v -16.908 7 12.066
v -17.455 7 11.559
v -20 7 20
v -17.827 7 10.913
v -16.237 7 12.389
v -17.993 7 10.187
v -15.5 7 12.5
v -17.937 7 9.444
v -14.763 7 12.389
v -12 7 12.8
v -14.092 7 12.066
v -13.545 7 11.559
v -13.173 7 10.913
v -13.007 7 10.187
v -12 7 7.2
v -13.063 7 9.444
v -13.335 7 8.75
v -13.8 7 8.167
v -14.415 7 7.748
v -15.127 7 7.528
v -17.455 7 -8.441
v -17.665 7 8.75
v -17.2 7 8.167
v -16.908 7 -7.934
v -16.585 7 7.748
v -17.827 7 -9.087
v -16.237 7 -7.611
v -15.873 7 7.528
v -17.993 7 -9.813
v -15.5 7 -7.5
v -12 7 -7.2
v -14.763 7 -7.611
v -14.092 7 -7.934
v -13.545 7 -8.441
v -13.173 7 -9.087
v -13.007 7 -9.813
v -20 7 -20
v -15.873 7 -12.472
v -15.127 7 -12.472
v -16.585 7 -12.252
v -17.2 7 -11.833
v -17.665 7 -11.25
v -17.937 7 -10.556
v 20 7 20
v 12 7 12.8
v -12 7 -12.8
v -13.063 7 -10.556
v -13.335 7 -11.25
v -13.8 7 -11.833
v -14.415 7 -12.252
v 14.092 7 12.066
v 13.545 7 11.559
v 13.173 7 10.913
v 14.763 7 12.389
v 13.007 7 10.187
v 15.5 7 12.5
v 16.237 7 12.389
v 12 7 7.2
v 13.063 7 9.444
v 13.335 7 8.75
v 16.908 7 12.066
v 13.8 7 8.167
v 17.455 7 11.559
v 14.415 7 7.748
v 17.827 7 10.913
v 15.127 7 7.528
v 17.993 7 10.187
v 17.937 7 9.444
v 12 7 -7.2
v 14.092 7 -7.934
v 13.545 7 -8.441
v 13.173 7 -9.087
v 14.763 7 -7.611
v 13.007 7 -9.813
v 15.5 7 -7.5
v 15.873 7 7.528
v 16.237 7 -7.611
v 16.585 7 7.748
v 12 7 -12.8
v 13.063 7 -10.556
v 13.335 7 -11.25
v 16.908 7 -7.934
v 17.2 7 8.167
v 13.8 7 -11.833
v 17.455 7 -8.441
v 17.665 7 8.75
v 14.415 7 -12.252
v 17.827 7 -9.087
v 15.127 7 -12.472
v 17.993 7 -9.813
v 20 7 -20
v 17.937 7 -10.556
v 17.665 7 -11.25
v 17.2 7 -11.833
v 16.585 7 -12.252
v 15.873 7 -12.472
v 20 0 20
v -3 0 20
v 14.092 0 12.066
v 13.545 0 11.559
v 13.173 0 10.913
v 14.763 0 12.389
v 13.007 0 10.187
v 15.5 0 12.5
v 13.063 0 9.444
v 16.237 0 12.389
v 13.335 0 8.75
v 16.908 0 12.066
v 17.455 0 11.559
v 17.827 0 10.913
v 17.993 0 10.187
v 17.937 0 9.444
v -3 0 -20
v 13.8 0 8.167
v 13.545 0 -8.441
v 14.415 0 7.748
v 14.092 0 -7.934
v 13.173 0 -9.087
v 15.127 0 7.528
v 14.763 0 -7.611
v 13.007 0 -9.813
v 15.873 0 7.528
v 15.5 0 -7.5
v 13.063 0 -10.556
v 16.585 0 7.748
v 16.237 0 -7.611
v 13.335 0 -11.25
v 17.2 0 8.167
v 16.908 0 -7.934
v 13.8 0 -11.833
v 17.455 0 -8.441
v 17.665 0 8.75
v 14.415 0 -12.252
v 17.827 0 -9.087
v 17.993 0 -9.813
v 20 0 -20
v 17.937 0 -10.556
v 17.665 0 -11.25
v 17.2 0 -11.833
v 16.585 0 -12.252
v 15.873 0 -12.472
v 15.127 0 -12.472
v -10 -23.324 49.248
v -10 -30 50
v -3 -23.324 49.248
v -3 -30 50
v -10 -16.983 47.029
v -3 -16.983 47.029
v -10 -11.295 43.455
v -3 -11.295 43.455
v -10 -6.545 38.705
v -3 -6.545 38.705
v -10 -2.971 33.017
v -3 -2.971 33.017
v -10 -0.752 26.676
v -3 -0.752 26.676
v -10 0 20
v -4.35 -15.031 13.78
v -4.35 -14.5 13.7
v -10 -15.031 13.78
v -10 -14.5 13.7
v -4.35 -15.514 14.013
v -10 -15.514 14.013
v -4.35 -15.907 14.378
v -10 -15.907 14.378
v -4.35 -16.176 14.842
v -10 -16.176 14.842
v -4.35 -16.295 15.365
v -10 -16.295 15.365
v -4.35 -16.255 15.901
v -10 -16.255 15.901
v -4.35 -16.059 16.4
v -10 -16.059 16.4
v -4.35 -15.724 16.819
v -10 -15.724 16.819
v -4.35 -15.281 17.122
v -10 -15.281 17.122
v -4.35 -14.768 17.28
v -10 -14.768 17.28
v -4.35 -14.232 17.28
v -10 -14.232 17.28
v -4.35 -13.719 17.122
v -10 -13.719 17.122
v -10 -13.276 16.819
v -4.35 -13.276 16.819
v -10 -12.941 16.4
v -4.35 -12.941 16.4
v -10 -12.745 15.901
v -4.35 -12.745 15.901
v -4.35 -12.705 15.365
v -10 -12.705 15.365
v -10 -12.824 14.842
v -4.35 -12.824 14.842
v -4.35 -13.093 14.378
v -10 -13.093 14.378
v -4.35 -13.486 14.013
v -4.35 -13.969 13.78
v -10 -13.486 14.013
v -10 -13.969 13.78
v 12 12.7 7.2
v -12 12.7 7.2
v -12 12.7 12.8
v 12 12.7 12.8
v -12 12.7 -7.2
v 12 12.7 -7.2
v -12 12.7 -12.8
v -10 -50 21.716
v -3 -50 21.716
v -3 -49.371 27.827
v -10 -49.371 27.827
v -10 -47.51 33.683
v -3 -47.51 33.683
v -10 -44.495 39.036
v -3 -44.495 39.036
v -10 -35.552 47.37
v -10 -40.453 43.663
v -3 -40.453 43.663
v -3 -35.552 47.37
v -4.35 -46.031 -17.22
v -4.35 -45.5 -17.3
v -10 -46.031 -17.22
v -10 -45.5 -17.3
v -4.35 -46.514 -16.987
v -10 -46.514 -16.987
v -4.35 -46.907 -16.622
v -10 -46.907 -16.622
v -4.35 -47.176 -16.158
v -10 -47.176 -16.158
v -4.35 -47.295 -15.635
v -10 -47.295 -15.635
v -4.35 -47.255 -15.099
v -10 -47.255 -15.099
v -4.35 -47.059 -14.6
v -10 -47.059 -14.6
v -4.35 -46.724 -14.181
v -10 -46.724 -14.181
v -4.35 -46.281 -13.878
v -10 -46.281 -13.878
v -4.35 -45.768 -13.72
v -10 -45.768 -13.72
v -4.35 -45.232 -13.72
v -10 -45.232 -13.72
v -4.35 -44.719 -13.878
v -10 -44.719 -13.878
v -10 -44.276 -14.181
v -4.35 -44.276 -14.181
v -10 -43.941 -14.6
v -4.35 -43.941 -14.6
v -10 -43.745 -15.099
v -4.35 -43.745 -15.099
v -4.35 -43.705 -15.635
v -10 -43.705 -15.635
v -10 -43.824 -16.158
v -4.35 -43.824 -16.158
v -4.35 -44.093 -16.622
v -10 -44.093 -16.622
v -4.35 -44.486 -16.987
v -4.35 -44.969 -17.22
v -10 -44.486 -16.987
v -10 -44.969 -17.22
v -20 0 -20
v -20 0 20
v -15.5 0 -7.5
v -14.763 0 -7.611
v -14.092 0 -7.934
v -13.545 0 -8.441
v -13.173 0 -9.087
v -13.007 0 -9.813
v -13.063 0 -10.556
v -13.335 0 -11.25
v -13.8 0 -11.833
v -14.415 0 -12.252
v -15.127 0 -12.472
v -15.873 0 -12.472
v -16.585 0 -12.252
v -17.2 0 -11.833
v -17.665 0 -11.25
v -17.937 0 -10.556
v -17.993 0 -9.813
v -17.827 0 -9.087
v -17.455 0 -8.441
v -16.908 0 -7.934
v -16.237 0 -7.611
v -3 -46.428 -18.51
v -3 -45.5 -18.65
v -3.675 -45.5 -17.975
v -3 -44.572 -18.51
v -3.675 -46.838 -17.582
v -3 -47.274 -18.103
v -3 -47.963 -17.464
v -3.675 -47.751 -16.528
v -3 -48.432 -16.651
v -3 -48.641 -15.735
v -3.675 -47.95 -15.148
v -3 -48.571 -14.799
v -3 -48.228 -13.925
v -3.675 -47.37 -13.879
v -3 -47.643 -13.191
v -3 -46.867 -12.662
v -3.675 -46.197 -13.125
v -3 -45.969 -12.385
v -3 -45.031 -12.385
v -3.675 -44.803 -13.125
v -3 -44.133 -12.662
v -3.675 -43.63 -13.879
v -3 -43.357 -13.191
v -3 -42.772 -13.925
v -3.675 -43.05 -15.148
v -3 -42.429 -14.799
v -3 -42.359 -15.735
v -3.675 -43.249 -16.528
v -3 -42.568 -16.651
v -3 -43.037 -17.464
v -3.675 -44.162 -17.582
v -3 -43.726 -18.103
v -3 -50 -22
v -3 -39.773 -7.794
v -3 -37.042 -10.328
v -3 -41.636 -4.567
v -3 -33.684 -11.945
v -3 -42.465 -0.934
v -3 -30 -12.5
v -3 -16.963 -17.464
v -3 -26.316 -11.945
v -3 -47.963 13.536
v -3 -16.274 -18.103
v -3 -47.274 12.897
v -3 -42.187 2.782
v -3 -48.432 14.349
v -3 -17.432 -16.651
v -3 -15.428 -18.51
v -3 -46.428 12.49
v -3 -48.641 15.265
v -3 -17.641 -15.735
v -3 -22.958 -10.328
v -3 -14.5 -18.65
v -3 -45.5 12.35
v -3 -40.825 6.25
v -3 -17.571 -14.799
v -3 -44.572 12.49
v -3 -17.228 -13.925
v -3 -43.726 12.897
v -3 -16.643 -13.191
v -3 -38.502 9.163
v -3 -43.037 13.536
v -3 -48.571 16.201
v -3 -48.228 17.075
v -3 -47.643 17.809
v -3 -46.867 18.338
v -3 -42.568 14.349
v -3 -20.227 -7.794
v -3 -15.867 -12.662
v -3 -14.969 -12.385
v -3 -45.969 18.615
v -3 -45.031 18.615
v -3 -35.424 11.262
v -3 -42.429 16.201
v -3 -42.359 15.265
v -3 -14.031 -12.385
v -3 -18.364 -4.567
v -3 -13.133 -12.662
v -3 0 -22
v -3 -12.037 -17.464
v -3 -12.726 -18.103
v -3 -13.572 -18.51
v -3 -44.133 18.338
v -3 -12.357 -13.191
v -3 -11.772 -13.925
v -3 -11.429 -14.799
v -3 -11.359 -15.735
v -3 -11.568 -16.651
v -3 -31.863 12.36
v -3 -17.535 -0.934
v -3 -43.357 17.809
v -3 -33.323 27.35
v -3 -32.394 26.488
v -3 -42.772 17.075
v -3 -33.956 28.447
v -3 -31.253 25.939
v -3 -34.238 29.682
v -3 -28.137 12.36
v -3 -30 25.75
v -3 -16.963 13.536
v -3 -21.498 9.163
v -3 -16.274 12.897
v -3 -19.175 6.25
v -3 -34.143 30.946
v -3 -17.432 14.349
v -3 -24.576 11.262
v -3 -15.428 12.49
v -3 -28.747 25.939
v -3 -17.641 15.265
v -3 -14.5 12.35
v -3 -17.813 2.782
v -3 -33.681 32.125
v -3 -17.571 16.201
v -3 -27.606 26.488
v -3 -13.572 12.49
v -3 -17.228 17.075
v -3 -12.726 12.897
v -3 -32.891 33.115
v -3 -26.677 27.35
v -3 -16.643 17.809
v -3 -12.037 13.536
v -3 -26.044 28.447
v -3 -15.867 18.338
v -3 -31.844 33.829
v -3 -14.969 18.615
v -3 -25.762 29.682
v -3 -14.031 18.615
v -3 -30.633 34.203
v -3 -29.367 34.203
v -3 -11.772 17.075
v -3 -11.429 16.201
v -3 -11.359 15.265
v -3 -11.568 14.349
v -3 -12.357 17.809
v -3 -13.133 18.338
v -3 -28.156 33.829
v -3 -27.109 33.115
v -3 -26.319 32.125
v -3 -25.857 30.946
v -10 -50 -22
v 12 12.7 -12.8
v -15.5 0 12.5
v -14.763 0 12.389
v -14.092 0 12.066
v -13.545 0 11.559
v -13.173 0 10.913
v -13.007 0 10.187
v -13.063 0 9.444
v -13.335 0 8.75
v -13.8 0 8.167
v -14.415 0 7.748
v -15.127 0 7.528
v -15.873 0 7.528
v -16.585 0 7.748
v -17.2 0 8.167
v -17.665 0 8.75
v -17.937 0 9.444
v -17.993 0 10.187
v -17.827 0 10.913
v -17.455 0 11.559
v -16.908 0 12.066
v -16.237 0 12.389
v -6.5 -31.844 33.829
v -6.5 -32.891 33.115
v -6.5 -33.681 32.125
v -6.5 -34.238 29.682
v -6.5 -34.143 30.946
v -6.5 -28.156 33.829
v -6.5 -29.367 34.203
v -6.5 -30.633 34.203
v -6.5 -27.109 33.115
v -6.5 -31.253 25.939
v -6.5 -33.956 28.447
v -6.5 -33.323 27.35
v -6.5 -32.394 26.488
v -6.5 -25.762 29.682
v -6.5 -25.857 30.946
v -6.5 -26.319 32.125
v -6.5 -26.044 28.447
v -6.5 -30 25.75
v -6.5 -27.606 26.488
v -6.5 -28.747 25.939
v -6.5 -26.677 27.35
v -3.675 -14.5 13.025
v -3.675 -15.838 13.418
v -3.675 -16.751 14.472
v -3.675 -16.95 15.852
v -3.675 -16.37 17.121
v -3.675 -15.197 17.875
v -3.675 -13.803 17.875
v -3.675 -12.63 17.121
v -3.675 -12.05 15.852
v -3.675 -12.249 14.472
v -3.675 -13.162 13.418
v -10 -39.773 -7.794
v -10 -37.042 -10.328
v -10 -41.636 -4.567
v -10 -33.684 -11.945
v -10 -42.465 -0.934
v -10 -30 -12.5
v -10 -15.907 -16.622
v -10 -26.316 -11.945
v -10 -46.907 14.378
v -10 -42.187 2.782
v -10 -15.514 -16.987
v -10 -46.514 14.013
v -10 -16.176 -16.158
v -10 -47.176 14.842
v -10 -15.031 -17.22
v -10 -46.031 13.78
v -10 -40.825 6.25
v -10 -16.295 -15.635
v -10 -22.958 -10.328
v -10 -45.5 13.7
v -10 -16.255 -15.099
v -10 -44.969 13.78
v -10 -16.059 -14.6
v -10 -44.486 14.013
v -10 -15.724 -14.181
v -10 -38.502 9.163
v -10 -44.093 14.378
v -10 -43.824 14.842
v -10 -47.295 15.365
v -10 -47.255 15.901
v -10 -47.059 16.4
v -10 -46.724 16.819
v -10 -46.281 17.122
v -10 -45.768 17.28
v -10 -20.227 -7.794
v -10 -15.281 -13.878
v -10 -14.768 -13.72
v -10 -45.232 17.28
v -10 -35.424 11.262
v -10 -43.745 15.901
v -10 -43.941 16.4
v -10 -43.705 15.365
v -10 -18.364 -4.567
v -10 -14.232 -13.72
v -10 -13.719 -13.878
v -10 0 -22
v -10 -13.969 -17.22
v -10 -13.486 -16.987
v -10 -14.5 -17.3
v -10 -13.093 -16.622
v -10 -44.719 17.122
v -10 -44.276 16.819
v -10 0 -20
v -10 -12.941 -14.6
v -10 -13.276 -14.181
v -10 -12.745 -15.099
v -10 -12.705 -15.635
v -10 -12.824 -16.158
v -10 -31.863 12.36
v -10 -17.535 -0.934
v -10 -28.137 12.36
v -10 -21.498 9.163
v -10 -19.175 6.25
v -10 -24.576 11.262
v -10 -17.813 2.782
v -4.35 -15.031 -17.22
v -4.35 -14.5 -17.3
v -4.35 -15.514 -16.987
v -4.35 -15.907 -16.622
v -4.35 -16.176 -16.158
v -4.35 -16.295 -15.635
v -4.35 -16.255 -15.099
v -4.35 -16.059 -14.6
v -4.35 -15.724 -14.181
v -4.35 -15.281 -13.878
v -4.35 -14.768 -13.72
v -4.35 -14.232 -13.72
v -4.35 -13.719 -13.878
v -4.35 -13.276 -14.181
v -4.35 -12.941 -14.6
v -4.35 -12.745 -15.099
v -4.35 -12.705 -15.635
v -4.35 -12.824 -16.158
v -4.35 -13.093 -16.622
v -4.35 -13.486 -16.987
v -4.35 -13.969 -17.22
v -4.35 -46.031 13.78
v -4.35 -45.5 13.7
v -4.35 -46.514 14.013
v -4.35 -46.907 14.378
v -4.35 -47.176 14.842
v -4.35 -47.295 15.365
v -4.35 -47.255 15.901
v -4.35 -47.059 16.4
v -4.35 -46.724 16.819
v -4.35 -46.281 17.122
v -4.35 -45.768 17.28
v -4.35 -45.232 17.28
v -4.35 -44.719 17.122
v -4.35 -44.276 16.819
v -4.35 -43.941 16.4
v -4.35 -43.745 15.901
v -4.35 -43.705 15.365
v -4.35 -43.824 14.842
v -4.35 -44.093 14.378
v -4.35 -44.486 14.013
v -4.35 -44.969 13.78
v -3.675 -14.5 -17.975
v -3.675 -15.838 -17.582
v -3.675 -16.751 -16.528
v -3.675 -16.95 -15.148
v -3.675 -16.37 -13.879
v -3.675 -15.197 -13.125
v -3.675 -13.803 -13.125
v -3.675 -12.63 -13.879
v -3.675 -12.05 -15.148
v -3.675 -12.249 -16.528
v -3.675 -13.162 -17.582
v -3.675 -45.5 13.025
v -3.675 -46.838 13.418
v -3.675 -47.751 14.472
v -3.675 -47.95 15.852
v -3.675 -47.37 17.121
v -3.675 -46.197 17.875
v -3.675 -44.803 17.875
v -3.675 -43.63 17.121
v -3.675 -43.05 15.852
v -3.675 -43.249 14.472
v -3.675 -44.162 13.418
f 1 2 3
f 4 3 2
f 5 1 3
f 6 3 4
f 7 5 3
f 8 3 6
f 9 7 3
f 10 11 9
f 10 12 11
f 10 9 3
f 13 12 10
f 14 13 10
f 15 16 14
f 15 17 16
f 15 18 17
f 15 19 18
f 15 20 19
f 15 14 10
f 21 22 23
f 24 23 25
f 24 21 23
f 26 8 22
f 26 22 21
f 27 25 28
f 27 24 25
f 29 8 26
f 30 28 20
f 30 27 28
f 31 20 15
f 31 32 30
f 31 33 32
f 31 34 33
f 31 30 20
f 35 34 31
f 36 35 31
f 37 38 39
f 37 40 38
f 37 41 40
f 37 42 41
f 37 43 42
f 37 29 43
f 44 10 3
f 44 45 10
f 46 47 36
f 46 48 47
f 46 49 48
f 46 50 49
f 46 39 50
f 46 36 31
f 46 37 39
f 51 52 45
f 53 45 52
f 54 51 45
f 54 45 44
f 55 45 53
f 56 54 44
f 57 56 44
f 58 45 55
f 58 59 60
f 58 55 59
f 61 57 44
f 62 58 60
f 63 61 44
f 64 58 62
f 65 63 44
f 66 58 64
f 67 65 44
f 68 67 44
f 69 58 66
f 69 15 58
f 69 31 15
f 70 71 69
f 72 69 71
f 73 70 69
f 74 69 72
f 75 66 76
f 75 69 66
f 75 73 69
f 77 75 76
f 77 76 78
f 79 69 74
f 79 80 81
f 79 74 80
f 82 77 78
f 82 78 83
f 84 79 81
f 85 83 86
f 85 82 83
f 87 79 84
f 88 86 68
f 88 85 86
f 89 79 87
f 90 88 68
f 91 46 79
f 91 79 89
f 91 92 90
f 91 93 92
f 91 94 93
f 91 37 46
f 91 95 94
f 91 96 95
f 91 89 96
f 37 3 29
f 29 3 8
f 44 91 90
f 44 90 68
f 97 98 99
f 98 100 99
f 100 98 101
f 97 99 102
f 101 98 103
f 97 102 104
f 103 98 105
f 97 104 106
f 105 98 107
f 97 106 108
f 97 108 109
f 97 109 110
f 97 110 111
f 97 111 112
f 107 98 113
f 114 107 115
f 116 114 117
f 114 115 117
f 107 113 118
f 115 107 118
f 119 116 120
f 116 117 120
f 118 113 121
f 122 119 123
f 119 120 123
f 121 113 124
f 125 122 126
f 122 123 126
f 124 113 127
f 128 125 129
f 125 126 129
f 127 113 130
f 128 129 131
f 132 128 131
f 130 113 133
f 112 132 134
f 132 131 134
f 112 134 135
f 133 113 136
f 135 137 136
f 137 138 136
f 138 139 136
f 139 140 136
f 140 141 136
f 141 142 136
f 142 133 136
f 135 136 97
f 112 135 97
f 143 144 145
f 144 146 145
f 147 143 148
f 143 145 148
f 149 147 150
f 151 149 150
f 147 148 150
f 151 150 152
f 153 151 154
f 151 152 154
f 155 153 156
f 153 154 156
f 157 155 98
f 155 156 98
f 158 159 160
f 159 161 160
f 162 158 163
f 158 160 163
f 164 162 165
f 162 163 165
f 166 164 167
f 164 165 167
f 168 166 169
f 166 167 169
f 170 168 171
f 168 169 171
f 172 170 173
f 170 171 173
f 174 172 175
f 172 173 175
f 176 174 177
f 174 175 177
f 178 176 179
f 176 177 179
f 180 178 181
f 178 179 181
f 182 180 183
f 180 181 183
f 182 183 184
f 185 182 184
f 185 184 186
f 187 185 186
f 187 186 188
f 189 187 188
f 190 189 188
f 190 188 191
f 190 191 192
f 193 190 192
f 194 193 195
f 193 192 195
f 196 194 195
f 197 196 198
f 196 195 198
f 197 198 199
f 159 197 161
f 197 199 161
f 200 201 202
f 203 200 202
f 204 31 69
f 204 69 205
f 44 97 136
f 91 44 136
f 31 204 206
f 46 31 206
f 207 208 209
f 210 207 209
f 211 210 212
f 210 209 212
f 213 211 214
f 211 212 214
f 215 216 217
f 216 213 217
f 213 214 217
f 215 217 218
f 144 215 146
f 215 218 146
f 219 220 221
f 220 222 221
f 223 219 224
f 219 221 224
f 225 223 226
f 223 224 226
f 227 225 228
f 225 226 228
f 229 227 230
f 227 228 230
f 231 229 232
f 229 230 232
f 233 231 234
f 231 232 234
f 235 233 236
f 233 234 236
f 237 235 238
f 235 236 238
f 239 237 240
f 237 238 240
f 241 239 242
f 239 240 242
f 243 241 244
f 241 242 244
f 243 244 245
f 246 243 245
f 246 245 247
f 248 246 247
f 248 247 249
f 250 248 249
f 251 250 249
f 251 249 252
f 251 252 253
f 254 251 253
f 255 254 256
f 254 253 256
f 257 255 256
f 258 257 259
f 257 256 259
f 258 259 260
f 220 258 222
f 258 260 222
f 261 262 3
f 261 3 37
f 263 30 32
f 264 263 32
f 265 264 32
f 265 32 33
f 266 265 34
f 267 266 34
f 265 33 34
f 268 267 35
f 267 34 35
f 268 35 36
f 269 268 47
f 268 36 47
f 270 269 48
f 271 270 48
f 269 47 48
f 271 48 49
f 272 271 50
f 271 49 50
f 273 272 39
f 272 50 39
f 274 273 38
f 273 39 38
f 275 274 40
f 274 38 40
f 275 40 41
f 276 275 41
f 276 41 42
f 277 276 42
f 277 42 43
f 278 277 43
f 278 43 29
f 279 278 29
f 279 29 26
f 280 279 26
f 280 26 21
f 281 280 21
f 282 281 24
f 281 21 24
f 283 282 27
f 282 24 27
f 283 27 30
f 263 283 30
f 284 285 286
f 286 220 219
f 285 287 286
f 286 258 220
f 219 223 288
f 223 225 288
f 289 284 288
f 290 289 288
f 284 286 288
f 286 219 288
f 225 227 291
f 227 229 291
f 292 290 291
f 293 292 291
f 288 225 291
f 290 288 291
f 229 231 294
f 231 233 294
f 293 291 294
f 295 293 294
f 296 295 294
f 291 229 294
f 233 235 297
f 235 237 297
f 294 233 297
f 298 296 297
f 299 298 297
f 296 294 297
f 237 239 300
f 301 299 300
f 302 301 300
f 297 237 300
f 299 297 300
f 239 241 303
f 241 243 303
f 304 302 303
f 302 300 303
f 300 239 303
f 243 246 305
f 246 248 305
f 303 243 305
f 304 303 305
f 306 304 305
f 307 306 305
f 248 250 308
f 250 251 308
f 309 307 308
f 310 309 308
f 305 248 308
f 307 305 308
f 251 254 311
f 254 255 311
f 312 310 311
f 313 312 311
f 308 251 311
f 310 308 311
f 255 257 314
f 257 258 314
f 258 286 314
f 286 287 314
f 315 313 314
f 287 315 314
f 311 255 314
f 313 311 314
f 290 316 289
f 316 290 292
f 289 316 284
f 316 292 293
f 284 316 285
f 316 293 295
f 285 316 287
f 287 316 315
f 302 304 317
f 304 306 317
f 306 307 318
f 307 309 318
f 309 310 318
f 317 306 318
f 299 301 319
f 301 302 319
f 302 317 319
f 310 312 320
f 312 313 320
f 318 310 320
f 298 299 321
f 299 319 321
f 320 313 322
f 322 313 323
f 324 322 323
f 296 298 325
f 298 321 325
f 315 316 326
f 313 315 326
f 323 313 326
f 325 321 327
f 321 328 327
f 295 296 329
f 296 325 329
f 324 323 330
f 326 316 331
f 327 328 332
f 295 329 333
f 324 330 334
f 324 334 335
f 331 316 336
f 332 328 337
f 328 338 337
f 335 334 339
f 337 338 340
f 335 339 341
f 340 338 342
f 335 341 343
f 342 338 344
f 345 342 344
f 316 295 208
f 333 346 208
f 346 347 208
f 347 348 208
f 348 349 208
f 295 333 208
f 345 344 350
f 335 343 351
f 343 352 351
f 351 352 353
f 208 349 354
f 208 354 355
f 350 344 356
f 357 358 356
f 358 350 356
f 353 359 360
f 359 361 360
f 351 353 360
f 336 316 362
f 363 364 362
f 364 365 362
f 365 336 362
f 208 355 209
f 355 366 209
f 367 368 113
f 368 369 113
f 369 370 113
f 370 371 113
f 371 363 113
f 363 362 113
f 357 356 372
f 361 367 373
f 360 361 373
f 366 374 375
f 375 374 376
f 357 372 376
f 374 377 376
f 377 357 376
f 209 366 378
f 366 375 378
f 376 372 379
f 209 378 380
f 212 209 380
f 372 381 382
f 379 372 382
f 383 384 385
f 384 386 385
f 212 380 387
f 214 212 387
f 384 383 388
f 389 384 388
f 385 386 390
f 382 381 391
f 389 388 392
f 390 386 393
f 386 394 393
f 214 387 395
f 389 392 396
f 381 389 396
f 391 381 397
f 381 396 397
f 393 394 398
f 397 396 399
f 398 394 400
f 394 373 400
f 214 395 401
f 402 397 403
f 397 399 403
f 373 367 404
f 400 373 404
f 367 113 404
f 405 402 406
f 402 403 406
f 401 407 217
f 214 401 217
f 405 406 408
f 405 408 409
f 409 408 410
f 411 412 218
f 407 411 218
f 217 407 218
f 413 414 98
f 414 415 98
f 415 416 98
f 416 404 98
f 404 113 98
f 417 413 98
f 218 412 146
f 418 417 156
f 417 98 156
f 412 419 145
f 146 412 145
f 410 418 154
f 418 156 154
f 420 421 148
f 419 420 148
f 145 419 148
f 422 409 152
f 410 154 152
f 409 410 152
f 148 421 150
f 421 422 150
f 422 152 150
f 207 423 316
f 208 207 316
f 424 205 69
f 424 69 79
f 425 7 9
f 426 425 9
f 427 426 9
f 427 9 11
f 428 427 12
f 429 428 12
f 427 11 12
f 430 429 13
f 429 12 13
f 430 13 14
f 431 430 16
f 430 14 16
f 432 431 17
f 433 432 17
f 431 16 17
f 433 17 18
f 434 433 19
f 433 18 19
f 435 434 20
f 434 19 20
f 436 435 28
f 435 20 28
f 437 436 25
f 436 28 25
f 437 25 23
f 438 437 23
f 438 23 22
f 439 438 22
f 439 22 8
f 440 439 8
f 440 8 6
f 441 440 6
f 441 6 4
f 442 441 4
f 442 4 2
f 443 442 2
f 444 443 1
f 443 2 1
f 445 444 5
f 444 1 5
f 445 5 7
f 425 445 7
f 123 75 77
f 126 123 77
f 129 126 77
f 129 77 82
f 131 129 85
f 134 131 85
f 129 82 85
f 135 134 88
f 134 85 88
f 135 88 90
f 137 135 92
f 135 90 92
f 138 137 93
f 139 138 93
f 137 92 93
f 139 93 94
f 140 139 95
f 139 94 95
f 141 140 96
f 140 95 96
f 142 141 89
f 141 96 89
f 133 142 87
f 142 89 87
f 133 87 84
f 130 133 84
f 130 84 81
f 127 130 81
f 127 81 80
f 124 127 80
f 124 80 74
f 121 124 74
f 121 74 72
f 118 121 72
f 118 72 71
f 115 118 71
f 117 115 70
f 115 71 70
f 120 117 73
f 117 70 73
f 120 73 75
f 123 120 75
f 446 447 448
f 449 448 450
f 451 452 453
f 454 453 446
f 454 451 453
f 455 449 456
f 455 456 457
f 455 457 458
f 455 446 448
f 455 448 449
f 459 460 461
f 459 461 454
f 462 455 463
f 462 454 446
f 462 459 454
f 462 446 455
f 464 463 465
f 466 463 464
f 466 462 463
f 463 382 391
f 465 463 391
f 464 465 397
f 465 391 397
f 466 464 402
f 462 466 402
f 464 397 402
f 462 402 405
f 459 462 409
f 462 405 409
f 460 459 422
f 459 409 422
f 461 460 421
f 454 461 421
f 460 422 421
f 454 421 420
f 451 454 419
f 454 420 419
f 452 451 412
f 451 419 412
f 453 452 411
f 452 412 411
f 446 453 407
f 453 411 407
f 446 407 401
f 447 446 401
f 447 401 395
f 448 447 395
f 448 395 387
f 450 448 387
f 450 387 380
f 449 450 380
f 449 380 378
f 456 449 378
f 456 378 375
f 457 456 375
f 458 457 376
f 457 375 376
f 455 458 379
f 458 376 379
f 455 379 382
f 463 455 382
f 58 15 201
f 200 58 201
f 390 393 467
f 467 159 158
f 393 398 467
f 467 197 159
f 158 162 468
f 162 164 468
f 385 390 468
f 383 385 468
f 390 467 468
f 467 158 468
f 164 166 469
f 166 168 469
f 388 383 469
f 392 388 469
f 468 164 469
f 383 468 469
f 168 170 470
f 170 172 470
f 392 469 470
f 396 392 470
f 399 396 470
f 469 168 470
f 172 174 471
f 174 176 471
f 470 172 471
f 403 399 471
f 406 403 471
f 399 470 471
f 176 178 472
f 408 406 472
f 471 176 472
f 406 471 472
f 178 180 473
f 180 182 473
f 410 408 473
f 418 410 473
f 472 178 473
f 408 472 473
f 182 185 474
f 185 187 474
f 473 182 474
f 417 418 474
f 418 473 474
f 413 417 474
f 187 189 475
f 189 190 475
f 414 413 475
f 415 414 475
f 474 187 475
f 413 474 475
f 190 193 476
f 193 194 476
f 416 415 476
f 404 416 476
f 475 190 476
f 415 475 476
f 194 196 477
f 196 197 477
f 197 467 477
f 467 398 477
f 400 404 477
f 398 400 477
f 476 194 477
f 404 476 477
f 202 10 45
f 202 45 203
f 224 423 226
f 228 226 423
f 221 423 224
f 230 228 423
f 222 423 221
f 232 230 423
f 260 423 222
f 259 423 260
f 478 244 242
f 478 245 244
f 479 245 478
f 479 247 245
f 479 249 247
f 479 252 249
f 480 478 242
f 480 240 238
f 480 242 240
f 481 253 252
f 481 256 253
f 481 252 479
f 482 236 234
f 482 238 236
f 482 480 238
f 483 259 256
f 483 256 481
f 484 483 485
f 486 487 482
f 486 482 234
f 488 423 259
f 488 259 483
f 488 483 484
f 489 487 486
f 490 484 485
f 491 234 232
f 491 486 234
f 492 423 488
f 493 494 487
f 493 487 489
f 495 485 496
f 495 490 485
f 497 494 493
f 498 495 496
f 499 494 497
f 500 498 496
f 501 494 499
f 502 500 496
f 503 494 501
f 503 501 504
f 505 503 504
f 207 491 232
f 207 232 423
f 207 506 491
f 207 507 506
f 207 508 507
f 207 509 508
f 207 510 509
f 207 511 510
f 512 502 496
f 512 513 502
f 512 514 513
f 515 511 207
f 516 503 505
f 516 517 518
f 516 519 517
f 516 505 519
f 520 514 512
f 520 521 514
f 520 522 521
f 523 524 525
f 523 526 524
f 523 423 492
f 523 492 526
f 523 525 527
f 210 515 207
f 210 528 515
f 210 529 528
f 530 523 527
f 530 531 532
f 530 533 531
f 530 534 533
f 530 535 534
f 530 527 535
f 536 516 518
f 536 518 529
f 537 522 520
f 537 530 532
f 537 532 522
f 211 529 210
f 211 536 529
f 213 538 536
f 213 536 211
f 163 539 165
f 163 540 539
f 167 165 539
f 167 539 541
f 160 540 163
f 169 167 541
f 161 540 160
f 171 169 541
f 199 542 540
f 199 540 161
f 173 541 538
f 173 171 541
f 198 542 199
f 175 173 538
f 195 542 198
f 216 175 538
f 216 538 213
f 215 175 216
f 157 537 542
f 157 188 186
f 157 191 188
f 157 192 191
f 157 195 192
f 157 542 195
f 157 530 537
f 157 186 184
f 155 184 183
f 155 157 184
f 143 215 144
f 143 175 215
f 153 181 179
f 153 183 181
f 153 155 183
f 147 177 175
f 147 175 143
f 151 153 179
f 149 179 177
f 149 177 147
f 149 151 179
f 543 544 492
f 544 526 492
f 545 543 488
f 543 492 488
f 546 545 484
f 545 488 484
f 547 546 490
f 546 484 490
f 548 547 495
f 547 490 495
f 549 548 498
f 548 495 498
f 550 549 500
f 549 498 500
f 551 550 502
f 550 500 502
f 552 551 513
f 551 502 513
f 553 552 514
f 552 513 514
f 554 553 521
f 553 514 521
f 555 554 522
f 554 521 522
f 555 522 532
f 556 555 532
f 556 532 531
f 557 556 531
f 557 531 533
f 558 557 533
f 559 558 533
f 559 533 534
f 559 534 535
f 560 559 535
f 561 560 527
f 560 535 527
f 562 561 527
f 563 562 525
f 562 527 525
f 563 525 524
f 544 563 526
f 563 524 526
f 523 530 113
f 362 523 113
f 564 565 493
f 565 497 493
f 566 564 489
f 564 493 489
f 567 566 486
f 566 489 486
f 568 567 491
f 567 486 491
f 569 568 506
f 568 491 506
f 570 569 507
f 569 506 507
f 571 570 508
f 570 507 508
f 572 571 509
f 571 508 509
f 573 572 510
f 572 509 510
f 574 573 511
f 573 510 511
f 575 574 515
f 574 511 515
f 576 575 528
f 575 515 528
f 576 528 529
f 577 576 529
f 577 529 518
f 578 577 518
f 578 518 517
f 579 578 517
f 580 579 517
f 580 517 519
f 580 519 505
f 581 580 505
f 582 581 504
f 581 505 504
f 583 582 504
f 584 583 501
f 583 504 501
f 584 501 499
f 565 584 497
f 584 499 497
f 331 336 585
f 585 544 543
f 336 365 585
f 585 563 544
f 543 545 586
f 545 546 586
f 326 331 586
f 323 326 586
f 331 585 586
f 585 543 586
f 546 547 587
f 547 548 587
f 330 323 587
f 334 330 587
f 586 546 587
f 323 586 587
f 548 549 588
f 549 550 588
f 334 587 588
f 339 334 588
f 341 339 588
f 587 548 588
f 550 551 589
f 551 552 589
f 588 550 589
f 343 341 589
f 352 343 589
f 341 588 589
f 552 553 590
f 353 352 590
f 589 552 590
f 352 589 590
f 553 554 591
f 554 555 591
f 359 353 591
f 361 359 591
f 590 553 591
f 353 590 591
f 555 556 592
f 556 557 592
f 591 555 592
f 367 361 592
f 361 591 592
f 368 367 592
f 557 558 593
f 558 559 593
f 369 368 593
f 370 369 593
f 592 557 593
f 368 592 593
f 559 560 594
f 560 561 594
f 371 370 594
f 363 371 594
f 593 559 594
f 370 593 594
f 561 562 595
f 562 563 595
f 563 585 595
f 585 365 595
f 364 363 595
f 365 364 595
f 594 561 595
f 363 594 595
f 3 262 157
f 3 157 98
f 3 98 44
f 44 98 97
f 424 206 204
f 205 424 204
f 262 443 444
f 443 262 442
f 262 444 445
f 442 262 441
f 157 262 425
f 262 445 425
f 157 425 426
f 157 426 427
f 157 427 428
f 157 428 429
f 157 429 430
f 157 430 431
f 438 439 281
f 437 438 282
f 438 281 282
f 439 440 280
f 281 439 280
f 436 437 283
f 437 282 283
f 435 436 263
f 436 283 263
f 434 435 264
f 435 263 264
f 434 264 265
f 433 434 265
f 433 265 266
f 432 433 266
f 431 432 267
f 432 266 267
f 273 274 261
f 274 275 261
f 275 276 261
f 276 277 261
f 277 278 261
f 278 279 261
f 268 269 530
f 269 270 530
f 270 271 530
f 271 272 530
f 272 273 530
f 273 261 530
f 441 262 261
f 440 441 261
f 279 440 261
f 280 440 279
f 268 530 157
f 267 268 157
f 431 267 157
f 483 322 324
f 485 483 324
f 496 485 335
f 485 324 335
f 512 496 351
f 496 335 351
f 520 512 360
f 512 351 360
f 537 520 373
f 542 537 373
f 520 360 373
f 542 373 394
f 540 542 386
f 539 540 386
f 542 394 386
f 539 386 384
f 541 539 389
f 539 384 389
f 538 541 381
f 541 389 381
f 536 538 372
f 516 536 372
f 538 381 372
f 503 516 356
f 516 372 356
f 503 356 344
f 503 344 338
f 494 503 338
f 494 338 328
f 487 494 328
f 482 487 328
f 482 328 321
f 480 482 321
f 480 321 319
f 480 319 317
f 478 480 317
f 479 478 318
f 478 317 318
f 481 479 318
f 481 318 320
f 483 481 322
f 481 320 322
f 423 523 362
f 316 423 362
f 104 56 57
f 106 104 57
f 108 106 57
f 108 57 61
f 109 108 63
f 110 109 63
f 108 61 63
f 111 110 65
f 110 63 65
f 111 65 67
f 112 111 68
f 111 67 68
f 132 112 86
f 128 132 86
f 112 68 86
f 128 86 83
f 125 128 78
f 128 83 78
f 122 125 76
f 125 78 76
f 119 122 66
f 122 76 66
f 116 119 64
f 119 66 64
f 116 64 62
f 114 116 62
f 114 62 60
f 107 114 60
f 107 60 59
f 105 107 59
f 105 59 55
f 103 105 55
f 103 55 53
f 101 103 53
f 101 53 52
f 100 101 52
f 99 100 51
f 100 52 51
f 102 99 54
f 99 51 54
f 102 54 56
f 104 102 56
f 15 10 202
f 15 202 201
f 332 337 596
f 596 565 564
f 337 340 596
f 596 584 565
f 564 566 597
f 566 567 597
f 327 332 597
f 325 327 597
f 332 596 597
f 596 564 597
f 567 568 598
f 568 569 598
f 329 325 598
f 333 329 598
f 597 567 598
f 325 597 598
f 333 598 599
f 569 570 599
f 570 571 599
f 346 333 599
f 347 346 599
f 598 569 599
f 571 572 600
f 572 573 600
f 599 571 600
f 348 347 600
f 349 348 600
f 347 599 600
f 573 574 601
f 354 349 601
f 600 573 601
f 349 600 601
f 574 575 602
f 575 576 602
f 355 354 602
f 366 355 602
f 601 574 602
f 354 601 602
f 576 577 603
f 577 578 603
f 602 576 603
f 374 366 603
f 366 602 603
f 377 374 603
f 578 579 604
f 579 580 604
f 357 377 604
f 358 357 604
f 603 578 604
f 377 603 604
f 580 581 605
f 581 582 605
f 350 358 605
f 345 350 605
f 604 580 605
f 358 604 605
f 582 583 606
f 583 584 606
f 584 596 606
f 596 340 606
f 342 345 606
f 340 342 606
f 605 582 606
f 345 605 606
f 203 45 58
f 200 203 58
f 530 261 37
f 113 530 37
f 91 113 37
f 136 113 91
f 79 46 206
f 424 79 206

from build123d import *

# Parameters (mm, degrees)
CROQUIS1_W                                           = 40
CROQUIS1_H                                           = 40
SALIENTE_EXTRUIR1_DEPTH                              = 7
CROQUIS3_W                                           = 5.6
CROQUIS3_H                                           = 5.7
SALIENTE_EXTRUIR3_DEPTH                              = 40
CROQUIS19_W                                          = 8
CROQUIS19_H                                          = 40
CORTAR_EXTRUIR5_DEPTH                                = 5.7
CROQUIS20_R                                          = 2.5
CORTAR_EXTRUIR6_DEPTH                                = 7
CROQUIS21_W                                          = 7
CROQUIS21_H                                          = 72
SALIENTE_EXTRUIR4_DEPTH                              = 50
CROQUIS22_R                                          = 12.5
CORTAR_EXTRUIR7_DEPTH                                = 7
AVELLANADO_PARA_TORNILLO_CON_CABEZA_PLAN_D           = 3.6
AVELLANADO_PARA_TORNILLO_CON_CABEZA_PLAN_CSINK_D     = 6.3
AVELLANADO_PARA_TORNILLO_CON_CABEZA_PLAN_CSINK_ANGLE = 90
CROQUIS25_R                                          = 4.25
CORTAR_EXTRUIR8_DEPTH                                = 3.5
REDONDEO1_R                                          = 30
REDONDEO2_R                                          = 30


# Some blends are built 0.0001 mm under size
with BuildPart() as part:
    # Croquis1 → Saliente-Extruir1 (new body)
    with BuildSketch(Plane(origin=(0, 0, 0), x_dir=(1, 0, 0), z_dir=(0, 1, 0))):
        Rectangle(CROQUIS1_W, CROQUIS1_H)
    extrude(amount=SALIENTE_EXTRUIR1_DEPTH)

    # Croquis3 → Saliente-Extruir3 (add)
    with BuildSketch(Plane.ZY.offset(20)):
        with Locations((10, 9.85)):
            Rectangle(CROQUIS3_W, CROQUIS3_H)
        with Locations((-10, 9.85)):
            Rectangle(CROQUIS3_W, CROQUIS3_H)
    extrude(amount=-SALIENTE_EXTRUIR3_DEPTH)

    # Croquis19 → Cortar-Extruir5 (cut)
    with BuildSketch(Plane(origin=(0, 12.7, 0), x_dir=(1, 0, 0), z_dir=(0, 1, 0))):
        with Locations((-16, 0)):
            Rectangle(CROQUIS19_W, CROQUIS19_H)
        with Locations((16, 0)):
            Rectangle(CROQUIS19_W, CROQUIS19_H)
    extrude(amount=-CORTAR_EXTRUIR5_DEPTH, mode=Mode.SUBTRACT)

    # Croquis20 → Cortar-Extruir6 (cut)
    with BuildSketch(Plane(origin=(0, 7, 0), x_dir=(1, 0, 0), z_dir=(0, 1, 0))):
        with Locations(Location((-15.5, 10, 0), (0, 0, 270))):
            Circle(CROQUIS20_R)
        with Locations(Location((15.5, 10, 0), (0, 0, 270))):
            Circle(CROQUIS20_R)
        with Locations(Location((15.5, -10, 0), (0, 0, 270))):
            Circle(CROQUIS20_R)
        with Locations(Location((-15.5, -10, 0), (0, 0, 270))):
            Circle(CROQUIS20_R)
    extrude(amount=-CORTAR_EXTRUIR6_DEPTH, mode=Mode.SUBTRACT)

    # Croquis21 → Saliente-Extruir4 (add)
    with BuildSketch(Plane.XZ):
        with Locations((-6.5, 14)):
            Rectangle(CROQUIS21_W, CROQUIS21_H)
    extrude(amount=SALIENTE_EXTRUIR4_DEPTH)

    # Croquis22 → Cortar-Extruir7 (cut)
    with BuildSketch(Plane(origin=(-3, 0, 0), x_dir=(0, 0, -1), z_dir=(1, 0, 0))):
        with Locations((0, -30)):
            Circle(CROQUIS22_R)
    extrude(amount=-CORTAR_EXTRUIR7_DEPTH, mode=Mode.SUBTRACT)

    # Avellanado para tornillo con cabeza plana de M31 (through all)
    with Locations(Plane(origin=(-3, -14.5, 15.5), x_dir=(0, 0, 1), z_dir=(1, 0, 0))):
        with Locations((0, 0), (-31, 0), (-31, 31), (0, 31)):
            CounterSinkHole(AVELLANADO_PARA_TORNILLO_CON_CABEZA_PLAN_D / 2, AVELLANADO_PARA_TORNILLO_CON_CABEZA_PLAN_CSINK_D / 2, counter_sink_angle=AVELLANADO_PARA_TORNILLO_CON_CABEZA_PLAN_CSINK_ANGLE)

    # Croquis25 → Cortar-Extruir8 (cut)
    with BuildSketch(Plane(origin=(-3, 0, 0), x_dir=(0, 0, -1), z_dir=(1, 0, 0))):
        with Locations((-30, -30)):
            Circle(CROQUIS25_R)
    extrude(amount=-CORTAR_EXTRUIR8_DEPTH, mode=Mode.SUBTRACT)

    # Redondeo1
    redondeo1_edges = [part.edges().sort_by_distance(p)[0] for p in [
        (-6.5, 0, 50),
    ]]
    fillet(redondeo1_edges, radius=REDONDEO1_R - 0.0001)  # a hair under: the kernel refuses the full size

    # Redondeo2
    # the kernel refuses this fillet: 30 mm, written as the material it takes off along each edge
    with BuildSketch(Plane(origin=(67.710766507, -50, 50), x_dir=(0, 1, 0), z_dir=(-1, 0, 0))) as redondeo2_piece_1:
        with BuildLine():
            CenterArc((30, 28.284306603), REDONDEO2_R, 180, 70.528981937)
            Line((0, 28.284306603), (-0.6, 28.284306603))
            Line((-0.6, 28.284306603), (-0.6, 0))
            Line((-0.6, 0), (0, -0.6))
            ThreePointArc((0, -0.6), (10.00005, -0.6), (19.800102, -0.565686132))
            Line((19.800102, -0.565686132), (20.0001, 0))
        make_face()
    extrude(amount=148.421533013, mode=Mode.SUBTRACT)


solid = part.part
